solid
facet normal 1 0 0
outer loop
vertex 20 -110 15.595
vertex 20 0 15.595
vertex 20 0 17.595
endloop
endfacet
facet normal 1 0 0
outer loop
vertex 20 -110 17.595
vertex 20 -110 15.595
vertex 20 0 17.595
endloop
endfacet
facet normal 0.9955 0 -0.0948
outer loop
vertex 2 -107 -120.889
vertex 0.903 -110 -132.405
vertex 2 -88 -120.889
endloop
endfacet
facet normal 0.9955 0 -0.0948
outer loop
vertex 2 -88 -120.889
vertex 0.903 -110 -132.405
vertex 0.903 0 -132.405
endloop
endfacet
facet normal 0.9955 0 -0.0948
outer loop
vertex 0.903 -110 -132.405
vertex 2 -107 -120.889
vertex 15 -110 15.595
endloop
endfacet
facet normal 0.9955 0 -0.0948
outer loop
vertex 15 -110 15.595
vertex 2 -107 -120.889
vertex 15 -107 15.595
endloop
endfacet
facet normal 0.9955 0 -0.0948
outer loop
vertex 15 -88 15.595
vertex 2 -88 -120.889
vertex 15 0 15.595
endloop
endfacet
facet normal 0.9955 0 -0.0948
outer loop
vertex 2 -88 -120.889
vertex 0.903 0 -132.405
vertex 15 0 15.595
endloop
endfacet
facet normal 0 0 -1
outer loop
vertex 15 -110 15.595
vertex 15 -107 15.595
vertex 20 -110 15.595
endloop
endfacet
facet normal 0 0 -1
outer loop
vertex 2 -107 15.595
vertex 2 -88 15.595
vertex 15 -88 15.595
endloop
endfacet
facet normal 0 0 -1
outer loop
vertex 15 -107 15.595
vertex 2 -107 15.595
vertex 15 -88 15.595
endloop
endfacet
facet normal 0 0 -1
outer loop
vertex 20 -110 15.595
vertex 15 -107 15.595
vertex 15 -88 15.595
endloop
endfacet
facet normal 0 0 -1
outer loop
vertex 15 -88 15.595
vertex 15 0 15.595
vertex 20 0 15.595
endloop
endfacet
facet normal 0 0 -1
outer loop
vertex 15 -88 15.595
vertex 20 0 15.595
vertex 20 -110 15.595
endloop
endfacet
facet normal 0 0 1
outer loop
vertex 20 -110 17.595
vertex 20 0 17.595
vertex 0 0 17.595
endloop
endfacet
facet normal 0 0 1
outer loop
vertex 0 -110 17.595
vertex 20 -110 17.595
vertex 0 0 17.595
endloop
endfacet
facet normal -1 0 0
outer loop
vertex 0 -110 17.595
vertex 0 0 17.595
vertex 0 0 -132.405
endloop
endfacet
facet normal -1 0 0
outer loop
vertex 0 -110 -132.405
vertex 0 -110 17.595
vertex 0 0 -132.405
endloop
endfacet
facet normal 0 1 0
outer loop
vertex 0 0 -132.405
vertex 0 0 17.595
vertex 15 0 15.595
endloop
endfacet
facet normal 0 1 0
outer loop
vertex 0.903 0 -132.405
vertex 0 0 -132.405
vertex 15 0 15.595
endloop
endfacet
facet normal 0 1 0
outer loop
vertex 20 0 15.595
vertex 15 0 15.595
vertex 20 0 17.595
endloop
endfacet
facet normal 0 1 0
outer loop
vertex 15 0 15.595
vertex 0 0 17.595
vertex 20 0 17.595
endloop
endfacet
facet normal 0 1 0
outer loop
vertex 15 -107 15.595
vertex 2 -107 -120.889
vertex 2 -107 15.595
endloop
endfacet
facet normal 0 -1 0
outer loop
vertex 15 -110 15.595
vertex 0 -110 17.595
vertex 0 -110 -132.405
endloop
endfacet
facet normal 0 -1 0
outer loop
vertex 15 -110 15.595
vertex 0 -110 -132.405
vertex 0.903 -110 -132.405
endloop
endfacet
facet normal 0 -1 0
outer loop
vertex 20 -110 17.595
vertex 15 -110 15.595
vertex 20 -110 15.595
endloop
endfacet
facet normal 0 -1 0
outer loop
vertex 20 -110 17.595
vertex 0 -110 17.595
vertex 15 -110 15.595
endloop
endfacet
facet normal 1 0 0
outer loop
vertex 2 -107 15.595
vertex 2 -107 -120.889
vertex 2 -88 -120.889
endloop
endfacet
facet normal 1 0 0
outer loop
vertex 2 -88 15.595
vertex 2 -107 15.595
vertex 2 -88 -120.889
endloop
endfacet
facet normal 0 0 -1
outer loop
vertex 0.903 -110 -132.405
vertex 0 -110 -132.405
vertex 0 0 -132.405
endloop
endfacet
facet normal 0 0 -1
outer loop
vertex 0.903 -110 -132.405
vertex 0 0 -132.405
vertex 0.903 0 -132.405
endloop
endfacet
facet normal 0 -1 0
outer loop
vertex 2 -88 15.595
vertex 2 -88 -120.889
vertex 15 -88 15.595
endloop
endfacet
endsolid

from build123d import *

# Parameters (mm, degrees)
F1_DEPTH = 110
F3_W     = 19
F3_H     = 148
F4_DEPTH = 18.001


with BuildPart() as f1:
    # F0 (on Front) → F1 (new body)
    with BuildSketch(Plane.XZ):
        Polygon((20, 17.5948), (0, 17.5948), (0, -132.4052), (0.90309, -132.4052), (15, 15.5948), (20, 15.5948), align=None)
    extrude(amount=F1_DEPTH)

    # F3 (on offset) → F4 (cut, through all)
    with BuildSketch(Plane.YZ.offset(2)):
        with Locations((-97.5, -58.4052)):
            Rectangle(F3_W, F3_H)
    extrude(amount=F4_DEPTH, mode=Mode.SUBTRACT)


solid = f1.part
